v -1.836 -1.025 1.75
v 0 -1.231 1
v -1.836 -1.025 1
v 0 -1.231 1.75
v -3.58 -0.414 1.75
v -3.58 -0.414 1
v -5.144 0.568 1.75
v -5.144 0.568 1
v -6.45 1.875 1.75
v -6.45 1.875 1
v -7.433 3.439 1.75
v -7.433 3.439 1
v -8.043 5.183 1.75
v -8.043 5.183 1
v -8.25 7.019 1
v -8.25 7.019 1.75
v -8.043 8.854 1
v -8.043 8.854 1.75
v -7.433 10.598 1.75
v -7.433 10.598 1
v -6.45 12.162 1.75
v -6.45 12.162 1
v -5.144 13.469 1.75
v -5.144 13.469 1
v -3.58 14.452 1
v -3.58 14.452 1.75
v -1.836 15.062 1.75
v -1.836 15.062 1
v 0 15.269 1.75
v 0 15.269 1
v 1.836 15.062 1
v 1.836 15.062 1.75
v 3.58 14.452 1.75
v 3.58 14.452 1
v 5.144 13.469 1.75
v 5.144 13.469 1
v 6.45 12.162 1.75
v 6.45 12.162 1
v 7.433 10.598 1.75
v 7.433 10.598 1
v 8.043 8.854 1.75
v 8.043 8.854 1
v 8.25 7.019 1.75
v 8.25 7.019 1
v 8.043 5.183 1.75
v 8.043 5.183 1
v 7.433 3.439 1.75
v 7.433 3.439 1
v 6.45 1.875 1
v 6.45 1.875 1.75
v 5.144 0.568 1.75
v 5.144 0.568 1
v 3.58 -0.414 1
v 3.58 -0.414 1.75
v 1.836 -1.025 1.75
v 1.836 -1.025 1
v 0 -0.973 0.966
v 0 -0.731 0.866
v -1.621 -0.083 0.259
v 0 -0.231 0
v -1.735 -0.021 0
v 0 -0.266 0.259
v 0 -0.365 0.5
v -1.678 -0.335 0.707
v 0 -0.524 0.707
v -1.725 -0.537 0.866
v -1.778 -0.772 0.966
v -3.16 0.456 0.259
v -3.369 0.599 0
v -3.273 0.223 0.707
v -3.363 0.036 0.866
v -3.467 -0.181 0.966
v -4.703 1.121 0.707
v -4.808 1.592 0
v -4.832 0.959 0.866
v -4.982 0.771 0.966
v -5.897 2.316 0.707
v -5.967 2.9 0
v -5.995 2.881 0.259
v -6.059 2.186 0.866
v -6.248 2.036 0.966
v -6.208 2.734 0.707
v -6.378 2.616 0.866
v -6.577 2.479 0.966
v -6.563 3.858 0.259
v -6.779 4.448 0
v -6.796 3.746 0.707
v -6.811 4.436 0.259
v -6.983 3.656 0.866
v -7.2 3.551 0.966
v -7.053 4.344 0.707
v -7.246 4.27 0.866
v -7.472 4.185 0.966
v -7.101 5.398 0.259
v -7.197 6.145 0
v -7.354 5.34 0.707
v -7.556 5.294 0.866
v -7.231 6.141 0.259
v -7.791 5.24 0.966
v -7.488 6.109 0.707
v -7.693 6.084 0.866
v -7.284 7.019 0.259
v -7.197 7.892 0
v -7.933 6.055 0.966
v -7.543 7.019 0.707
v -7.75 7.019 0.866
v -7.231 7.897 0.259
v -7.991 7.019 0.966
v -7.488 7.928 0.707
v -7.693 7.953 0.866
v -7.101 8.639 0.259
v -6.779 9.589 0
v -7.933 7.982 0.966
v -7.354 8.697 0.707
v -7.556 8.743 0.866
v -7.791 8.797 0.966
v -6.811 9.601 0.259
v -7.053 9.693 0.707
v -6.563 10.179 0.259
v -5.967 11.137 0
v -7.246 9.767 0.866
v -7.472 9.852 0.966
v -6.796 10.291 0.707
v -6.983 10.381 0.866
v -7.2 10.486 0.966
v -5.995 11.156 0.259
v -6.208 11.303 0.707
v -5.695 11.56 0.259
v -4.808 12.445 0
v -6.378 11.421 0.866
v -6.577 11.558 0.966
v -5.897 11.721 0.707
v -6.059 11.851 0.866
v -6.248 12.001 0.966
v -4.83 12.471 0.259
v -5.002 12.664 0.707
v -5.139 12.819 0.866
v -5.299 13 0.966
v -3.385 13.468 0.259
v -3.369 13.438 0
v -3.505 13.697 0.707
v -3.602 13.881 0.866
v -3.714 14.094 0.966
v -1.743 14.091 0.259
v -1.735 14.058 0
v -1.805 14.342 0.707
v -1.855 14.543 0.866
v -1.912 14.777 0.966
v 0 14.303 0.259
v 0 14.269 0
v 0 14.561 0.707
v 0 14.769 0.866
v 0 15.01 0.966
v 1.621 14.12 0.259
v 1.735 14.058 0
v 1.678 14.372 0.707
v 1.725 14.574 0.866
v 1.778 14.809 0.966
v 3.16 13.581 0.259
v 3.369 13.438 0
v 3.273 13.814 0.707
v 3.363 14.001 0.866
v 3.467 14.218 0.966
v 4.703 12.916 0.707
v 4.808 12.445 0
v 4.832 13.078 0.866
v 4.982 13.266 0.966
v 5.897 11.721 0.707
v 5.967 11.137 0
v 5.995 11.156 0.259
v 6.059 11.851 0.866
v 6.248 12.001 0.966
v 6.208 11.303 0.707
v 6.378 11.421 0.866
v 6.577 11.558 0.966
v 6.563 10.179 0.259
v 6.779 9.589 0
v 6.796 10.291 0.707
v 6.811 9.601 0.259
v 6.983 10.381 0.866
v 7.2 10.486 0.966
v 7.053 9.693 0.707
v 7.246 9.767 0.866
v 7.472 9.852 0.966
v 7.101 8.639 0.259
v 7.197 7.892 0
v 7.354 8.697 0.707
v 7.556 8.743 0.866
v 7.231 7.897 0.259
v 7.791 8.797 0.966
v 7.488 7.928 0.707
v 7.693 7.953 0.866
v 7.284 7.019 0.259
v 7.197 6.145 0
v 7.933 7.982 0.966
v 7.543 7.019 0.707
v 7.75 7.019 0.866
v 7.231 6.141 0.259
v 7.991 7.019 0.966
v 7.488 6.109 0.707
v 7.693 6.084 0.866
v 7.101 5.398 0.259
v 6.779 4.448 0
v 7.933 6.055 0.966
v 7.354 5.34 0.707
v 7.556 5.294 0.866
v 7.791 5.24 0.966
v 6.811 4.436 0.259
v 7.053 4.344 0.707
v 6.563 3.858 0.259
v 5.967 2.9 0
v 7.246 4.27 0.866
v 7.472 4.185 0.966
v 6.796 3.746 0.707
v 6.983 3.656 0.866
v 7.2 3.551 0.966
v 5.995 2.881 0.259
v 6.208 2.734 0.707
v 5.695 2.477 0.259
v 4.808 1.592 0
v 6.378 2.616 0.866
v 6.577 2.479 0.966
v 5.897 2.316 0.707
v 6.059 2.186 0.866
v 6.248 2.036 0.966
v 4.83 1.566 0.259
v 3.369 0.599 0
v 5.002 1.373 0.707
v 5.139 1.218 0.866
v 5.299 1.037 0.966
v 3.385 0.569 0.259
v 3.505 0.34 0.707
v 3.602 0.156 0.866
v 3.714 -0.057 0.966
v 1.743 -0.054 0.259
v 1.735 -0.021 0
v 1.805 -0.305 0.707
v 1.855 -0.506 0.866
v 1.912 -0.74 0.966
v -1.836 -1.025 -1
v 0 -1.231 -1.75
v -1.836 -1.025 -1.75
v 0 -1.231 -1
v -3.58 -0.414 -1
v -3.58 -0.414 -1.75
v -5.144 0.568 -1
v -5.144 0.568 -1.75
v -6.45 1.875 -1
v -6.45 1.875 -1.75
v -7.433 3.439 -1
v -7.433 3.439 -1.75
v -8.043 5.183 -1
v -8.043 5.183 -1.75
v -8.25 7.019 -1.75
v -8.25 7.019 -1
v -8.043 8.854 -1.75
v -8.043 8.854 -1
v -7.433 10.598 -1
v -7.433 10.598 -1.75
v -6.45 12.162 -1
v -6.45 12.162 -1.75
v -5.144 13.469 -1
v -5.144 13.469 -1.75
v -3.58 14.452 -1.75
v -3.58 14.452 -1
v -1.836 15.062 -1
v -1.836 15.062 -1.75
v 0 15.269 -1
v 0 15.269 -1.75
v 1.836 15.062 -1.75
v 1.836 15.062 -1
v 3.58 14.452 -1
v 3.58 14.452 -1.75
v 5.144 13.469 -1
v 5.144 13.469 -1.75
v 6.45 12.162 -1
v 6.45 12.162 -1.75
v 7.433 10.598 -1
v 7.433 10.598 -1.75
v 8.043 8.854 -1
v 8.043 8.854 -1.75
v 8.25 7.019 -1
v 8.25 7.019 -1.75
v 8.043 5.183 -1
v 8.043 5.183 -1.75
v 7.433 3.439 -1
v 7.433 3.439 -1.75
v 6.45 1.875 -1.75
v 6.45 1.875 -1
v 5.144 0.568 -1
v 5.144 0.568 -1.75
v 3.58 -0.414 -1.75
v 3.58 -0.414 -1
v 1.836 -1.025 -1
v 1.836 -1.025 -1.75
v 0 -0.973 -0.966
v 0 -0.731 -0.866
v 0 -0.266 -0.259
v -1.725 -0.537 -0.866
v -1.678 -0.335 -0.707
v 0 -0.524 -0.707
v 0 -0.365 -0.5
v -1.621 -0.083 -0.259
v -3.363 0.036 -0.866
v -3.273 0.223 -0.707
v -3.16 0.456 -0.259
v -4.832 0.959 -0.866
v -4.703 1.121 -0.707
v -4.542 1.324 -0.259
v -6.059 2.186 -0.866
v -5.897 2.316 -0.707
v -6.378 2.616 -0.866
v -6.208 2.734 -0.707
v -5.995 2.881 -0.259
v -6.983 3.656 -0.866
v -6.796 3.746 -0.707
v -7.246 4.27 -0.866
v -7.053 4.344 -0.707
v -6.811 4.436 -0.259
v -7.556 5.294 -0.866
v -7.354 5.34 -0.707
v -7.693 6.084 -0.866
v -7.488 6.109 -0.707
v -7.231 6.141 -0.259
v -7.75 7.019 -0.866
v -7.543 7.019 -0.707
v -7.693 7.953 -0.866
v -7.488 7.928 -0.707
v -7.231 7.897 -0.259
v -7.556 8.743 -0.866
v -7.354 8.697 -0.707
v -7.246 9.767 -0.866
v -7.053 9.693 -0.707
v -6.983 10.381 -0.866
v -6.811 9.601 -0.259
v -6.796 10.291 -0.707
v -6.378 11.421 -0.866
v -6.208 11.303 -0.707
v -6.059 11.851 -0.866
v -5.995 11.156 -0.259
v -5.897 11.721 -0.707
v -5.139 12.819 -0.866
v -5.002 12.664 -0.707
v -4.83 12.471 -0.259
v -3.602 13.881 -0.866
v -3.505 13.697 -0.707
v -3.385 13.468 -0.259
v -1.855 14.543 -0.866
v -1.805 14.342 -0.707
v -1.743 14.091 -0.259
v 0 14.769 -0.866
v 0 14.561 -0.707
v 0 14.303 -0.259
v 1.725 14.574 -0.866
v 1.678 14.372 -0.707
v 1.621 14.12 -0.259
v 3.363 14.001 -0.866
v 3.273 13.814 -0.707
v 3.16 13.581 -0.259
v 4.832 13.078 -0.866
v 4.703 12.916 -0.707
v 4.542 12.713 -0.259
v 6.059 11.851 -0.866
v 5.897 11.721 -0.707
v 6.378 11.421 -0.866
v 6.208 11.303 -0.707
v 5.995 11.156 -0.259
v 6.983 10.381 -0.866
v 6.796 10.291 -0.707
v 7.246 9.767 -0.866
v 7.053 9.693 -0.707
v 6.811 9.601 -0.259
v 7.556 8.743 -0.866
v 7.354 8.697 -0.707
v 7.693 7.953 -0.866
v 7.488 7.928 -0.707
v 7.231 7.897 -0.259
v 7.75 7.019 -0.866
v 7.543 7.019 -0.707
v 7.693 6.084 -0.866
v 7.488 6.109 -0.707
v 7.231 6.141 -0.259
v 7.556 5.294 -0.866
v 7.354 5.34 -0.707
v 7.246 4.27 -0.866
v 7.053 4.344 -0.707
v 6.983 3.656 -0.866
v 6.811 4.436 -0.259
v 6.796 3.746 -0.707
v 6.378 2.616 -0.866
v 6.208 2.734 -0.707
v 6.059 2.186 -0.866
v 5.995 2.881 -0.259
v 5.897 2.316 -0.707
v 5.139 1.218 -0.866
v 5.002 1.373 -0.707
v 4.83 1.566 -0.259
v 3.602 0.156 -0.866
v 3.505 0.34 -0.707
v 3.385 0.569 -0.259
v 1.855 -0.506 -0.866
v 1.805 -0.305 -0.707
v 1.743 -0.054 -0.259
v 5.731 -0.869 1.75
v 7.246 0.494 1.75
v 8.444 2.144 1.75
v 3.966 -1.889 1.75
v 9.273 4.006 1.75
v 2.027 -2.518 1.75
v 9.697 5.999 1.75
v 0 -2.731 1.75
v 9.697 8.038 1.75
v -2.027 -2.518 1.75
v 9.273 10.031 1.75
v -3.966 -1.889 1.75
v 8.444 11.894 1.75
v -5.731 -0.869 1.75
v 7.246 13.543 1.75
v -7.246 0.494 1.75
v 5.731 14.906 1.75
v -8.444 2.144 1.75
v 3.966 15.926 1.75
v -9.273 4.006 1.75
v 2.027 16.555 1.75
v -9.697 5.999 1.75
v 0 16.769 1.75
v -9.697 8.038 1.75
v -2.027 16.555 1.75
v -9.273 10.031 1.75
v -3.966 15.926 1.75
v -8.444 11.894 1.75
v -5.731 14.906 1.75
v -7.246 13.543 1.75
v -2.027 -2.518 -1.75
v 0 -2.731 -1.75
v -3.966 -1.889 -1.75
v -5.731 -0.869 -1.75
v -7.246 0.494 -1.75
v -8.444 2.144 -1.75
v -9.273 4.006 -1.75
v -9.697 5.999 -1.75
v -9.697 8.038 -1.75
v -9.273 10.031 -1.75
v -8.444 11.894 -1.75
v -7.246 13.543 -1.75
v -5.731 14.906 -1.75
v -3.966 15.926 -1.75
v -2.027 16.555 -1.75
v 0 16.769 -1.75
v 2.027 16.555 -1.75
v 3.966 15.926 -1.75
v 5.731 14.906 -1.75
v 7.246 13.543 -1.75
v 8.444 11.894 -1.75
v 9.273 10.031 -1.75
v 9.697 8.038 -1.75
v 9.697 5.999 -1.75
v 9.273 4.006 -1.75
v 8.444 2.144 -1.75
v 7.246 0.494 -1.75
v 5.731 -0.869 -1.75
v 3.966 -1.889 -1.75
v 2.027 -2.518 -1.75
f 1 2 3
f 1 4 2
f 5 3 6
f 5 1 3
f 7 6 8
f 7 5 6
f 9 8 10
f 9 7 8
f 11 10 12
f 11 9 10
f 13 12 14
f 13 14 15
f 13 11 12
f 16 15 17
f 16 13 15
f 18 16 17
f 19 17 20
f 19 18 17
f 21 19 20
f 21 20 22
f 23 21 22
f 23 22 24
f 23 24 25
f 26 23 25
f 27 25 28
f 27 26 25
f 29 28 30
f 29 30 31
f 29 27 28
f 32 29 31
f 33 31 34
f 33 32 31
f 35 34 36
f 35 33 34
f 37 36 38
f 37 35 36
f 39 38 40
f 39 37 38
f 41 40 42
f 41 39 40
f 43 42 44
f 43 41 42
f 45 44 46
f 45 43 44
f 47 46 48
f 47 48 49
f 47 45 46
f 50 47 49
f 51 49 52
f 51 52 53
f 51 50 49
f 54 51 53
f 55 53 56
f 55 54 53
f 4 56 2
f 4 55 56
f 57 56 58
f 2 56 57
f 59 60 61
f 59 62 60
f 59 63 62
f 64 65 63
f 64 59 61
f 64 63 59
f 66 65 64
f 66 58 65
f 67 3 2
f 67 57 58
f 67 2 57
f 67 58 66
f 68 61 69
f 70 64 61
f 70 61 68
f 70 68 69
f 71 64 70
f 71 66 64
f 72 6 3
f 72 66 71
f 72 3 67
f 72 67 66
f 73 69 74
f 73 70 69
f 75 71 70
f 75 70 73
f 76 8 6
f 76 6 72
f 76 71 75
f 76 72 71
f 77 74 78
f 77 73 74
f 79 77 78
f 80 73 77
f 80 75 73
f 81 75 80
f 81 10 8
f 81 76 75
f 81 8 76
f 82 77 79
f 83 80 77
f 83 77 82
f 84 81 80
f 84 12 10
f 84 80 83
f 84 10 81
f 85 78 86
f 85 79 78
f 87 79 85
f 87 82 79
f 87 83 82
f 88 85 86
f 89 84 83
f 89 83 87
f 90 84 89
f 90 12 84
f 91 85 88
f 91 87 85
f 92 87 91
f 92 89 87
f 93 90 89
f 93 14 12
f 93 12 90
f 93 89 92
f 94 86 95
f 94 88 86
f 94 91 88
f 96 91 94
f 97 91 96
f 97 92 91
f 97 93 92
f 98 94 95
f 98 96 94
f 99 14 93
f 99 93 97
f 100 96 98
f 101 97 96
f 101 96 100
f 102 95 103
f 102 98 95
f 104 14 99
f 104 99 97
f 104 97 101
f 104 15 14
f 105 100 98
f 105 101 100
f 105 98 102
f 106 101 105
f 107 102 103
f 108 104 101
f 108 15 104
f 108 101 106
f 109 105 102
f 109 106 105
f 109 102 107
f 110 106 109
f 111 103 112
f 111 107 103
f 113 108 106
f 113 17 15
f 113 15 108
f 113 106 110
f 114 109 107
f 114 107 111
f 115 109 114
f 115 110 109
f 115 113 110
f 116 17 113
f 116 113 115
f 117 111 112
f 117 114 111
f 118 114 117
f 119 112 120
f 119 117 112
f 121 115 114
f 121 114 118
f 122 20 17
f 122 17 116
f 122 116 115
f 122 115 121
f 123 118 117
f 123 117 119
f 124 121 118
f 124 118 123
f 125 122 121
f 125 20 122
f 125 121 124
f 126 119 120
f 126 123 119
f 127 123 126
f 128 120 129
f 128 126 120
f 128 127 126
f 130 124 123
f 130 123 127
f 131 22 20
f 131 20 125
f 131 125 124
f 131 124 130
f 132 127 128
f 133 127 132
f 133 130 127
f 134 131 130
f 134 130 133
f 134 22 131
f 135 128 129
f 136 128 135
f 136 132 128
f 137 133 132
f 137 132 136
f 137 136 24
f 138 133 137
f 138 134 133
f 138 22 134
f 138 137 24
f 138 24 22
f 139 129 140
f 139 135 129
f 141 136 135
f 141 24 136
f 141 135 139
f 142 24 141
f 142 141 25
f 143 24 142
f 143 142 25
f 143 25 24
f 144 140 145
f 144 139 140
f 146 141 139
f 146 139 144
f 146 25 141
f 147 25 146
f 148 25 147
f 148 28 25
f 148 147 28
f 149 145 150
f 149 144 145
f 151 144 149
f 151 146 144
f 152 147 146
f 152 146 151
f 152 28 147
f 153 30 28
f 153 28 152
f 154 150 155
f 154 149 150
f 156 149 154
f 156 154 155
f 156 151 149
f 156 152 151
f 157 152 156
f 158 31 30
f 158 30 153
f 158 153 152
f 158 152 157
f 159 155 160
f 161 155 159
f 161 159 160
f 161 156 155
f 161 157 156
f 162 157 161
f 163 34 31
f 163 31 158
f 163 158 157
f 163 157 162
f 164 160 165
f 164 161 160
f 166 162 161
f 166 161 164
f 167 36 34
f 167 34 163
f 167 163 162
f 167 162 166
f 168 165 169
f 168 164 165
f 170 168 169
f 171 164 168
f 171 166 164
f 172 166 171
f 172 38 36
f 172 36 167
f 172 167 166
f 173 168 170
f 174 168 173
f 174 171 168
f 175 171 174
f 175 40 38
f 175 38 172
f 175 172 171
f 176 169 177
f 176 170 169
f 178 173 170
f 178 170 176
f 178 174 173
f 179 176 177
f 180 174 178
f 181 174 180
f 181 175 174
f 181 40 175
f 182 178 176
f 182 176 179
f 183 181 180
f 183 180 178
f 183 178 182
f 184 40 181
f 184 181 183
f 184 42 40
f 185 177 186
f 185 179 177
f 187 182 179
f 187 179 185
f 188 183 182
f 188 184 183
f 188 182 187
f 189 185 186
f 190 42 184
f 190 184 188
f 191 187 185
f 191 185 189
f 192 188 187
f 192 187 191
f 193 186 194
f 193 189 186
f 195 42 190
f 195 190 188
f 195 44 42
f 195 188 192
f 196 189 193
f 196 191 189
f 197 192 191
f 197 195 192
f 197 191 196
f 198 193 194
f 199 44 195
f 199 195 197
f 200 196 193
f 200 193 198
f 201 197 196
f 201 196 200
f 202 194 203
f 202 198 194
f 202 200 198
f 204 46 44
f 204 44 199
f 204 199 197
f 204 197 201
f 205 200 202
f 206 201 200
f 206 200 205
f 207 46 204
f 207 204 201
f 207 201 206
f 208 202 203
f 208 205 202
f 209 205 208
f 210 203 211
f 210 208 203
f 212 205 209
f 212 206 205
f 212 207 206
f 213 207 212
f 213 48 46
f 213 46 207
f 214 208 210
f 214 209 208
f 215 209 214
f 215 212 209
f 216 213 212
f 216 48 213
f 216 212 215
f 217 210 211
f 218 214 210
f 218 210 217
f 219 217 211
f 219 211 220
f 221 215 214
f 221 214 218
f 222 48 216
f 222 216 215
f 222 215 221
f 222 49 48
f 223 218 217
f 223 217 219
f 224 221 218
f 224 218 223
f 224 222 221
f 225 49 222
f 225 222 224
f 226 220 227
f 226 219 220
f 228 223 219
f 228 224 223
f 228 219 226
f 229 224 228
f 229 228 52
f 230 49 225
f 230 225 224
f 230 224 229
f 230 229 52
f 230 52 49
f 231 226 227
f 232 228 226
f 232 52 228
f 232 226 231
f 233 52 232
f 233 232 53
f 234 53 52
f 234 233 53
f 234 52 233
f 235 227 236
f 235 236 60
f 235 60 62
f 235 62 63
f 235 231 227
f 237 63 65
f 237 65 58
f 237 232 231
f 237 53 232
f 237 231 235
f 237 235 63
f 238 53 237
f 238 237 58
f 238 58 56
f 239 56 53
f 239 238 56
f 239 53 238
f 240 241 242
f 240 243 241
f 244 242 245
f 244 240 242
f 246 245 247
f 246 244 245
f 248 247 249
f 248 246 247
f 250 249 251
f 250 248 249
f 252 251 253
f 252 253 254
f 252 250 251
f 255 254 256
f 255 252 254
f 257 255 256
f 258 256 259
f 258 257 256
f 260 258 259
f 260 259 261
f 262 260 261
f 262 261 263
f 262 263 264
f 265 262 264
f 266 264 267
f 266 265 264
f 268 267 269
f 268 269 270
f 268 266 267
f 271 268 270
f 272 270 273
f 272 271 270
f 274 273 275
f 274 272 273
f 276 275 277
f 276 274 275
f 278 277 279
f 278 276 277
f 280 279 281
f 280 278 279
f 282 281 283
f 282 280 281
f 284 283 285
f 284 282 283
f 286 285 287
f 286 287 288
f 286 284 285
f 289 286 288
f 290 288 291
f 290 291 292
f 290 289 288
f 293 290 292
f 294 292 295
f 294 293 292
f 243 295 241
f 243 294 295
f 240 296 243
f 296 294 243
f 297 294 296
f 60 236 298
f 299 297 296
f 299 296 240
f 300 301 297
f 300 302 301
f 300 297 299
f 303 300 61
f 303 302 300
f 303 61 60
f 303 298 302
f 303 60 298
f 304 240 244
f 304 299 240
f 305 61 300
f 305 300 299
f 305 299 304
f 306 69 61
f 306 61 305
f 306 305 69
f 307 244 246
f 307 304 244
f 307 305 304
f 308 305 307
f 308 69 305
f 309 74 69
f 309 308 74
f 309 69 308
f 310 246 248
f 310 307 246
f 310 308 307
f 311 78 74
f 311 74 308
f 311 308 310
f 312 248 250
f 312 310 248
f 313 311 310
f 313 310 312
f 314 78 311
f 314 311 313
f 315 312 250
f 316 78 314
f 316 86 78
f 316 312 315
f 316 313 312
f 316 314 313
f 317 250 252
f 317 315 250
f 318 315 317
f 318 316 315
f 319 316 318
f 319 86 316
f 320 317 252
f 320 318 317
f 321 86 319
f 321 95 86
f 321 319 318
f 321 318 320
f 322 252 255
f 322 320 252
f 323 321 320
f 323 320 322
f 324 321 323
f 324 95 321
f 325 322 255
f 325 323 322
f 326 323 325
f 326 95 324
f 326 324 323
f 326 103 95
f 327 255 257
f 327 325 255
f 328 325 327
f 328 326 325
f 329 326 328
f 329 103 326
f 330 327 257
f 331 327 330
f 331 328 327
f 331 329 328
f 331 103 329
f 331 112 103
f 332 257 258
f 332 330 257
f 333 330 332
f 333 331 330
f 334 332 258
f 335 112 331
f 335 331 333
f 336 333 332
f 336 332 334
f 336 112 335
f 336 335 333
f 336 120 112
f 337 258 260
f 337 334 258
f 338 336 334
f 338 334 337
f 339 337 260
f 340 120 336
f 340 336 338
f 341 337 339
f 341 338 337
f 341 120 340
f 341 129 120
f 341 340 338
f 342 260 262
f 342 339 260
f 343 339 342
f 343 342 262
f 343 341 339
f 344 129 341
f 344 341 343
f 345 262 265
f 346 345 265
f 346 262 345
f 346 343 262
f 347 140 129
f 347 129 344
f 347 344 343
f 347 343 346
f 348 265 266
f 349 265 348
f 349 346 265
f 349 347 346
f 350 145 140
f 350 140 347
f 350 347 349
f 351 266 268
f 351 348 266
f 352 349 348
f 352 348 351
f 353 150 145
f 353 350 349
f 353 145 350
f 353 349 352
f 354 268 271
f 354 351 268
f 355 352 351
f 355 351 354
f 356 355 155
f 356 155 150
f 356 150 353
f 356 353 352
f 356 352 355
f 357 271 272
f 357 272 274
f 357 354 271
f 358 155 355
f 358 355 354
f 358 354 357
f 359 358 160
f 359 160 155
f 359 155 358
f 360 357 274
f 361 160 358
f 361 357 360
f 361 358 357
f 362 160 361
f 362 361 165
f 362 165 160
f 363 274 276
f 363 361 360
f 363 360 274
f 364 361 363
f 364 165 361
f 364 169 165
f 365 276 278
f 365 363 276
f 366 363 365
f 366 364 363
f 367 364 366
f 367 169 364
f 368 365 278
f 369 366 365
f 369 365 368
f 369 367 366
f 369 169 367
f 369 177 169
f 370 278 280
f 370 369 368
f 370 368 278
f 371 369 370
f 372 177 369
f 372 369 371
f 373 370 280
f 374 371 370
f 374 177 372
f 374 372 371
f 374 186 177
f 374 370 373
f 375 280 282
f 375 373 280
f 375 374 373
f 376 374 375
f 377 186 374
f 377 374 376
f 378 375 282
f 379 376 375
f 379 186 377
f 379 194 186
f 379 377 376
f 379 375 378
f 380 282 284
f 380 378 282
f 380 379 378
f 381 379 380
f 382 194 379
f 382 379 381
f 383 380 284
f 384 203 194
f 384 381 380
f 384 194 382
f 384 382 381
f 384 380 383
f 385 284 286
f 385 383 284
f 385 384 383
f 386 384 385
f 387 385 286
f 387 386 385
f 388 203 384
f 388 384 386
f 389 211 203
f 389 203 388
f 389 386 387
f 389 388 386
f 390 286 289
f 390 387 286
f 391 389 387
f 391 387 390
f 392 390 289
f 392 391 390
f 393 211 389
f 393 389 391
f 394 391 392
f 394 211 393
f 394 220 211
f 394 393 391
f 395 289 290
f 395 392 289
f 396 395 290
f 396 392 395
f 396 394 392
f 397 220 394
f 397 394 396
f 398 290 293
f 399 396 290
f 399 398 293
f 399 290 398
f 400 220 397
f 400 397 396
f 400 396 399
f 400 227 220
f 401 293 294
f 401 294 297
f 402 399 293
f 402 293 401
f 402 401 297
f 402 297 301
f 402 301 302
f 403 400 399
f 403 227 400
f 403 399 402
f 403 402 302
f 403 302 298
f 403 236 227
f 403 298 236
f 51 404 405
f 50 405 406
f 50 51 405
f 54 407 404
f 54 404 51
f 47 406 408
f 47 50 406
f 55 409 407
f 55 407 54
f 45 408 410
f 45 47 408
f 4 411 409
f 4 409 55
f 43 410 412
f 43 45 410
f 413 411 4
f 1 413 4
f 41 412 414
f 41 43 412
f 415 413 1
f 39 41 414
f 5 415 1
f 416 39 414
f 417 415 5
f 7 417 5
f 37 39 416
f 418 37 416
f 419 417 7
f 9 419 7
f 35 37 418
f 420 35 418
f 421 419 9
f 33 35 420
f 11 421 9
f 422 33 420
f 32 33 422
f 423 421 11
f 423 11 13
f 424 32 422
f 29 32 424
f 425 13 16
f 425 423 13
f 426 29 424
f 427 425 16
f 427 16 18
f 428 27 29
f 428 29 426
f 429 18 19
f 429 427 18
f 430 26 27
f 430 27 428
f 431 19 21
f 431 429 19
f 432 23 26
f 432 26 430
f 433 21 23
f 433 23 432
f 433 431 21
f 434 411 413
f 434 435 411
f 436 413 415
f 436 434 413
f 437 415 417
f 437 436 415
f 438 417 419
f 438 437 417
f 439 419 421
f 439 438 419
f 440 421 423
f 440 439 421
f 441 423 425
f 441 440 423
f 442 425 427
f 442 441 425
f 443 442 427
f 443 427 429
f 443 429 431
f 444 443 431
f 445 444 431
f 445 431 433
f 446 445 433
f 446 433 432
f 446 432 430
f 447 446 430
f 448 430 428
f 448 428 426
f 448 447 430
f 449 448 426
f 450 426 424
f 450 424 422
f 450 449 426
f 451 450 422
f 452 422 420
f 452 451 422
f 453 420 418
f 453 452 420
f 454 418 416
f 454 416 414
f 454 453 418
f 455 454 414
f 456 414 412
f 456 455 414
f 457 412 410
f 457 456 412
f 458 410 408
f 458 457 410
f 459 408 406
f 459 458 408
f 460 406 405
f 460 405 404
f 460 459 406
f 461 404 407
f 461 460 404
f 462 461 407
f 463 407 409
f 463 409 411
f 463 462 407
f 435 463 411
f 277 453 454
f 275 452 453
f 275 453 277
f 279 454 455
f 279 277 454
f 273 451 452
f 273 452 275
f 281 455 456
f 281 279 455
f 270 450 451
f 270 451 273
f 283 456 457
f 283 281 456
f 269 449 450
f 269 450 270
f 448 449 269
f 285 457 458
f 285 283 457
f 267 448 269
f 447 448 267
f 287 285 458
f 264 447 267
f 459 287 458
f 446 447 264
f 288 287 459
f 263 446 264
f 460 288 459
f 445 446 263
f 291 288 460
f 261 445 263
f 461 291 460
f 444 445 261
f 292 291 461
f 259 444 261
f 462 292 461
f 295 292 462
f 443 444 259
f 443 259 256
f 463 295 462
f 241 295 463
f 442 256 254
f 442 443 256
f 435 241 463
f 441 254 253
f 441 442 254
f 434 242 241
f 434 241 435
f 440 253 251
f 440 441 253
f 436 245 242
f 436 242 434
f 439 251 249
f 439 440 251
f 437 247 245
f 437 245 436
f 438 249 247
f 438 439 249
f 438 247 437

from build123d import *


with BuildPart() as f1:
    # F0 (on Right) → F1 (revolve)
    with BuildSketch(Plane.YZ):
        with BuildLine():
            Line((-2.731482, 1.75), (-2.731482, 0))
            Line((-2.731482, 0), (-2.731482, -1.75))
            Line((-2.731482, -1.75), (-1.231482, -1.75))
            Line((-1.231482, -1.75), (-1.231482, -1))
            ThreePointArc((-1.231482, -1), (-0.524375, -0.707107), (-0.231482, 0))
            ThreePointArc((-0.231482, 0), (-0.524375, 0.707107), (-1.231482, 1))
            Line((-1.231482, 1), (-1.231482, 1.75))
            Line((-1.231482, 1.75), (-2.731482, 1.75))
        make_face()
    revolve(axis=Axis((0, 7.018518, 0.16714), (0, 0, -1)))


solid = f1.part
